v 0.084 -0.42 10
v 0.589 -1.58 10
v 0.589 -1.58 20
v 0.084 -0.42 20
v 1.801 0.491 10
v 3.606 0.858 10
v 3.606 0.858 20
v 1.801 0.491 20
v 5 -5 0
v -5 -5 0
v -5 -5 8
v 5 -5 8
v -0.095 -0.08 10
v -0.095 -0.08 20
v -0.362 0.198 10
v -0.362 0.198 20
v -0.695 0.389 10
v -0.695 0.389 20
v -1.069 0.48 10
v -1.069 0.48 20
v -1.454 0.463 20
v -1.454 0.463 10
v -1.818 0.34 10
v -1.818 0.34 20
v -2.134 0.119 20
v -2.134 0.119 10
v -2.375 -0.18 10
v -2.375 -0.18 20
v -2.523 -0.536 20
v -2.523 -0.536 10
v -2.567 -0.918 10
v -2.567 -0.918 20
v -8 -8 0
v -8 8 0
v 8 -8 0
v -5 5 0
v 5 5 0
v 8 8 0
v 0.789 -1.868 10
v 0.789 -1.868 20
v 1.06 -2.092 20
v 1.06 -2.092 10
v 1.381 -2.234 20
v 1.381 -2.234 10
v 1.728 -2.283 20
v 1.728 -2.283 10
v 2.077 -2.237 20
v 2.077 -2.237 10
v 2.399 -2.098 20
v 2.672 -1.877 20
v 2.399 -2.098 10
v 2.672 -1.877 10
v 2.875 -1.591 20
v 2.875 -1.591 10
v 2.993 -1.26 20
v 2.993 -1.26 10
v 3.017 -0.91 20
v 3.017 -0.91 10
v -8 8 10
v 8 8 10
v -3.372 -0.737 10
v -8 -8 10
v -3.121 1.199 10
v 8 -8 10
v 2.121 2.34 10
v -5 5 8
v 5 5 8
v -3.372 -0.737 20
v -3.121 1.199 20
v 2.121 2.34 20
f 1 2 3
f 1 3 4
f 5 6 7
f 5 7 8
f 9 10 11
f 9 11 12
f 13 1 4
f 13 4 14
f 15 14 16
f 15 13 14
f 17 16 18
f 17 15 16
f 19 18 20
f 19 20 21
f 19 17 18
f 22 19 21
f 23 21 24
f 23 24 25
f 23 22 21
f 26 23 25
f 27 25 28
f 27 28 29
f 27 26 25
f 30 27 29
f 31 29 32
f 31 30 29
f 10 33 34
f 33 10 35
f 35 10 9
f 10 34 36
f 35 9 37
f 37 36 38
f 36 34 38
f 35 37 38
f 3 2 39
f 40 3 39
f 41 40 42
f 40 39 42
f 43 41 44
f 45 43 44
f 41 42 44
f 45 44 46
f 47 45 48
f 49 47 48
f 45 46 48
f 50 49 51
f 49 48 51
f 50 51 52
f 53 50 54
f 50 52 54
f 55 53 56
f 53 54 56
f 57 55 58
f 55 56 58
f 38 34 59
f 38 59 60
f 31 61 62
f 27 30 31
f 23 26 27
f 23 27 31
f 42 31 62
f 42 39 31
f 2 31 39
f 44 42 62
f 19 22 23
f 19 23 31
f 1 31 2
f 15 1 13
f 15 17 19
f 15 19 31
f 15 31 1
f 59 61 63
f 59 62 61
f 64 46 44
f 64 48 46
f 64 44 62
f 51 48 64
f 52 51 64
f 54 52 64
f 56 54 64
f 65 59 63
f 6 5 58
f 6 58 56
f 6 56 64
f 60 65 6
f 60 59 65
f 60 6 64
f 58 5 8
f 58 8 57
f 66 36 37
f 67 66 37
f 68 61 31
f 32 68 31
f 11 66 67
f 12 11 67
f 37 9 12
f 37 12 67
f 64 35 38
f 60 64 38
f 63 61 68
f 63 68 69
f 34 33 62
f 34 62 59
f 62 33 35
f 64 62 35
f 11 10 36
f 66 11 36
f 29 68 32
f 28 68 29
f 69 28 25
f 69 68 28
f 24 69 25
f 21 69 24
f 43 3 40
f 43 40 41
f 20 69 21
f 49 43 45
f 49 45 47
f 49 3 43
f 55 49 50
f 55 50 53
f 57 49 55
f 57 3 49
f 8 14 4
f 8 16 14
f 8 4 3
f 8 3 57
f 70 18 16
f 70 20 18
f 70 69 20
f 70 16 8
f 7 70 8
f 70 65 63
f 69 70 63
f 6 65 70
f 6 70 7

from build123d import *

# Parameters (mm, degrees)
BOX001_W      = 10
BOX001_H      = 10
BOX001_DEPTH  = 8
EXTRUDE_DEPTH = 10
BOX_W         = 16
BOX_H         = 16
BOX_DEPTH     = 10


with BuildPart() as cube001:
    # Box001 → Box001 (new body)
    with BuildSketch(Plane(origin=(-5, -5, 0), x_dir=(1, 0, 0), z_dir=(0, 0, 1))):
        with Locations((5, 5)):
            Rectangle(BOX001_W, BOX001_H)
    extrude(amount=BOX001_DEPTH)


with BuildPart() as extrude_body:
    # Sketch → Extrude (new body)
    with BuildSketch(Plane.XY):
        with BuildLine():
            Line((1.12075, 2.839983), (-4.120749, 1.699111))
            Line((-4.371559, -0.236927), (-4.120749, 1.699111))
            Line((-4.371559, -0.236927), (-3.566567, -0.41805))
            ThreePointArc((-0.915655, 0.079537), (-2.453717, 0.963407), (-3.566567, -0.41805))
            Line((-0.411383, -1.079694), (-0.915655, 0.079537))
            ThreePointArc((-0.411383, -1.079694), (1.076577, -1.73701), (2.017311, -0.409942))
            Line((0.800522, 0.990688), (2.017311, -0.409942))
            Line((2.605595, 1.358264), (0.800522, 0.990688))
            Line((1.12075, 2.839983), (2.605595, 1.358264))
        make_face()
    extrude(amount=EXTRUDE_DEPTH)


with BuildPart() as extrude_body_1:
    # Extrude placement: moved
    add(extrude_body.part.moved(Location((1, -0.5, 10))))


with BuildPart() as cut:
    # Box → Box (new body)
    with BuildSketch(Plane(origin=(-8, -8, 0), x_dir=(1, 0, 0), z_dir=(0, 0, 1))):
        with Locations((8, 8)):
            Rectangle(BOX_W, BOX_H)
    extrude(amount=BOX_DEPTH)

    # Fusion: union Extrude body
    add(extrude_body_1.part)

    # Cut: cut Cube001
    add(cube001.part, mode=Mode.SUBTRACT)


solid = cut.part
